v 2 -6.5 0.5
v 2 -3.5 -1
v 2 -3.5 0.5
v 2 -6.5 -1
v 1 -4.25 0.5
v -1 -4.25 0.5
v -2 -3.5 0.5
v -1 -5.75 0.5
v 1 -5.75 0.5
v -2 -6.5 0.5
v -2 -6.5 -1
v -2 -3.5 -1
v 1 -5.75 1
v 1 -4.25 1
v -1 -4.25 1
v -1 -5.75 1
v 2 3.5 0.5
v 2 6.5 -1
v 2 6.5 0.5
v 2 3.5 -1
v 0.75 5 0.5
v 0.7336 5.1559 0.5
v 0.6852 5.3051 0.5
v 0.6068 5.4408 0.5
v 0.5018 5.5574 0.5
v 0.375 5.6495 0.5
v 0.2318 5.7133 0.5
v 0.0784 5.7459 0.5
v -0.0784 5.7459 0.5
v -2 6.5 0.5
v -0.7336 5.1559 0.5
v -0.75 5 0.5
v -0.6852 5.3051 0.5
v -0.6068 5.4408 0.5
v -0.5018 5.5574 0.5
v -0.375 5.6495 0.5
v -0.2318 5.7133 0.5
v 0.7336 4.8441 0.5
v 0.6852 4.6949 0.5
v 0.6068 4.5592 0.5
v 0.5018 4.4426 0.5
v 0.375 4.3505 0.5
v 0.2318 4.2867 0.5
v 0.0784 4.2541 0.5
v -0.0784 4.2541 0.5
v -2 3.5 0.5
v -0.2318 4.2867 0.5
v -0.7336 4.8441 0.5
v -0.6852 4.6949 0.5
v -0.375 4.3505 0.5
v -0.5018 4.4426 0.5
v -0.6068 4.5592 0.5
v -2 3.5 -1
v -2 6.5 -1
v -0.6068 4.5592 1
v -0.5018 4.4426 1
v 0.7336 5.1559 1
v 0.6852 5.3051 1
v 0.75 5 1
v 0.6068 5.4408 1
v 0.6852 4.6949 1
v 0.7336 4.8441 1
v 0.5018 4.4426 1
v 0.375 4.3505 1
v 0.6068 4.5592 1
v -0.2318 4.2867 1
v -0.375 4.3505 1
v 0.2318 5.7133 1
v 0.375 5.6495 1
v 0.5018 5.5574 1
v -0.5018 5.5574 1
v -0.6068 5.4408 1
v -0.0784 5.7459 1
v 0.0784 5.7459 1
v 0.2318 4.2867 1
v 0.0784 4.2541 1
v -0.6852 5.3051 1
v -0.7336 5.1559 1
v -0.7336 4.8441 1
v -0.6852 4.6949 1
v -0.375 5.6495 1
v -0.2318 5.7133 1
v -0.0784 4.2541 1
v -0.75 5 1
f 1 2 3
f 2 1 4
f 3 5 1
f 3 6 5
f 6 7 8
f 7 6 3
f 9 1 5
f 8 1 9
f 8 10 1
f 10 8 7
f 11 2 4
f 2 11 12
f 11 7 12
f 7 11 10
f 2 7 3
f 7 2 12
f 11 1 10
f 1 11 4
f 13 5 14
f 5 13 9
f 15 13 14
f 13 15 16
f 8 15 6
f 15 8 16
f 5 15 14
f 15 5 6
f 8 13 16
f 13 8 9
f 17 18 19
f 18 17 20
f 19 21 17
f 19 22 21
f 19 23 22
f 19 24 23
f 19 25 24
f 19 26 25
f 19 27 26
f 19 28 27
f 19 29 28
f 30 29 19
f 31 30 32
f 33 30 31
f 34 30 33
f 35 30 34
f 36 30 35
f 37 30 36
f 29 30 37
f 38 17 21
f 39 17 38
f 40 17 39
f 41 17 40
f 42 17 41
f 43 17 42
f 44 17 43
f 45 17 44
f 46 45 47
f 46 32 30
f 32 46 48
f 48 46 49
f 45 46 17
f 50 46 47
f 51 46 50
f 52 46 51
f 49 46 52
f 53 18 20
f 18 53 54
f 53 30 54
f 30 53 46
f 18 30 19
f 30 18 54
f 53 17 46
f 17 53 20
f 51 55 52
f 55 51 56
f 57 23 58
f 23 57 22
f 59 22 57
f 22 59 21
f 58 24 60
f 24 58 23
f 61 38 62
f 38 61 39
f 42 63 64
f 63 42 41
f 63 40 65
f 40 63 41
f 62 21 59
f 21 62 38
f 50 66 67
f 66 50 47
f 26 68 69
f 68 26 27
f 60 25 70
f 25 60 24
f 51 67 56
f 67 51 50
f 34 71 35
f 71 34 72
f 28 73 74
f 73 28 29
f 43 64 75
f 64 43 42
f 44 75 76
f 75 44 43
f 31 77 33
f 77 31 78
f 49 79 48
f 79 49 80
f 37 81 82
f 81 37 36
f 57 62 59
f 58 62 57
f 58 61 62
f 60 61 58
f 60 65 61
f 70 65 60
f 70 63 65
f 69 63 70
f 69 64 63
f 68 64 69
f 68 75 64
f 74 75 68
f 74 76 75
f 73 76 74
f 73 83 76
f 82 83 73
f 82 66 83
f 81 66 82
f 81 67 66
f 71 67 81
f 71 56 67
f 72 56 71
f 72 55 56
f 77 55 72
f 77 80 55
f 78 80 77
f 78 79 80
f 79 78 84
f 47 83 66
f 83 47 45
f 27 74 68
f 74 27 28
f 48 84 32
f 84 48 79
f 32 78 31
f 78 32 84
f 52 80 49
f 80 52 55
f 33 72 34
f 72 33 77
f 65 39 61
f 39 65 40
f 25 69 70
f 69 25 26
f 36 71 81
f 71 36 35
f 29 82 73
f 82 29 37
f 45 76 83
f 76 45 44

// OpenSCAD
// file: ../globals.scad
// Copyright (c) 2017 Clément Bœsch <u pkh.me>
//
// Permission to use, copy, modify, and distribute this software for any
// purpose with or without fee is hereby granted, provided that the above
// copyright notice and this permission notice appear in all copies.
//
// THE SOFTWARE IS PROVIDED "AS IS" AND THE AUTHOR DISCLAIMS ALL WARRANTIES
// WITH REGARD TO THIS SOFTWARE INCLUDING ALL IMPLIED WARRANTIES OF
// MERCHANTABILITY AND FITNESS. IN NO EVENT SHALL THE AUTHOR BE LIABLE FOR
// ANY SPECIAL, DIRECT, INDIRECT, OR CONSEQUENTIAL DAMAGES OR ANY DAMAGES
// WHATSOEVER RESULTING FROM LOSS OF USE, DATA OR PROFITS, WHETHER IN AN
// ACTION OF CONTRACT, NEGLIGENCE OR OTHER TORTIOUS ACTION, ARISING OUT OF
// OR IN CONNECTION WITH THE USE OR PERFORMANCE OF THIS SOFTWARE.

$fn = 30;

_delta = 0.005;

c_black        = [.17,.17,.17];
c_black_redish = [.35,.30,.30];
c_gold         = [.75,.55,.00];
c_gray         = [.40,.40,.40];
c_darkgray     = [.25,.25,.25];
c_green_pcb    = [.00,.50,.25];
c_metal        = [.70,.70,.70];
c_yellow       = [.70,.70,.30];
c_darkblue     = [.20,.30,.40];
// file: _internal.scad
// Copyright (c) 2017 Clément Bœsch <u pkh.me>
//
// Permission to use, copy, modify, and distribute this software for any
// purpose with or without fee is hereby granted, provided that the above
// copyright notice and this permission notice appear in all copies.
//
// THE SOFTWARE IS PROVIDED "AS IS" AND THE AUTHOR DISCLAIMS ALL WARRANTIES
// WITH REGARD TO THIS SOFTWARE INCLUDING ALL IMPLIED WARRANTIES OF
// MERCHANTABILITY AND FITNESS. IN NO EVENT SHALL THE AUTHOR BE LIABLE FOR
// ANY SPECIAL, DIRECT, INDIRECT, OR CONSEQUENTIAL DAMAGES OR ANY DAMAGES
// WHATSOEVER RESULTING FROM LOSS OF USE, DATA OR PROFITS, WHETHER IN AN
// ACTION OF CONTRACT, NEGLIGENCE OR OTHER TORTIOUS ACTION, ARISING OUT OF
// OR IN CONNECTION WITH THE USE OR PERFORMANCE OF THIS SOFTWARE.

include <../globals.scad>

$vpr = [50, 0, 90];

module components_demo(pad=30) {
    n = $children;
    cols = ceil(sqrt(n));
    rows = ceil(n / cols);
    offx = pad * (rows - 1) / 2;
    offy = pad * (cols - 1) / 2;
    for (i = [0:n-1]) {
        x = floor(i / cols);
        y = i % cols;
        translate([x*pad - offx, y*pad - offy])
            rotate(360 * $t)
                children(i);
    }
}
// main file
// Copyright (c) 2017 Clément Bœsch <u pkh.me>
//
// Permission to use, copy, modify, and distribute this software for any
// purpose with or without fee is hereby granted, provided that the above
// copyright notice and this permission notice appear in all copies.
//
// THE SOFTWARE IS PROVIDED "AS IS" AND THE AUTHOR DISCLAIMS ALL WARRANTIES
// WITH REGARD TO THIS SOFTWARE INCLUDING ALL IMPLIED WARRANTIES OF
// MERCHANTABILITY AND FITNESS. IN NO EVENT SHALL THE AUTHOR BE LIABLE FOR
// ANY SPECIAL, DIRECT, INDIRECT, OR CONSEQUENTIAL DAMAGES OR ANY DAMAGES
// WHATSOEVER RESULTING FROM LOSS OF USE, DATA OR PROFITS, WHETHER IN AN
// ACTION OF CONTRACT, NEGLIGENCE OR OTHER TORTIOUS ACTION, ARISING OUT OF
// OR IN CONNECTION WITH THE USE OR PERFORMANCE OF THIS SOFTWARE.

include <_internal.scad>

$vpd = 50;

module button(dim=[4, 3, 2], pusher_h=.5, pusher_type="square", clr=c_metal) {
    base_dim   = [dim[0], dim[1], dim[2]-pusher_h];
    pusher_dim = [base_dim[0]/2, base_dim[1]/2, pusher_h];

    color(clr)
        translate([0, 0, -pusher_h/2])
            cube(base_dim, center=true);
    color(c_black)
        translate([0, 0, base_dim[2]/2])
            if (pusher_type == "circle")
                cylinder(d=min(base_dim[0], base_dim[1]) / 2, h=pusher_h, center=true);
            else
                cube(pusher_dim, center=true);
}

function button_info() = [
    ["category", "button"],
    ["watch", "nowhere"],
];

function button_drill_info() = [
    ["category", "button"],
    ["watch", "sky"],
];

components_demo(pad=10) {
    button(pusher_type="square");
    button(pusher_type="circle");
}
